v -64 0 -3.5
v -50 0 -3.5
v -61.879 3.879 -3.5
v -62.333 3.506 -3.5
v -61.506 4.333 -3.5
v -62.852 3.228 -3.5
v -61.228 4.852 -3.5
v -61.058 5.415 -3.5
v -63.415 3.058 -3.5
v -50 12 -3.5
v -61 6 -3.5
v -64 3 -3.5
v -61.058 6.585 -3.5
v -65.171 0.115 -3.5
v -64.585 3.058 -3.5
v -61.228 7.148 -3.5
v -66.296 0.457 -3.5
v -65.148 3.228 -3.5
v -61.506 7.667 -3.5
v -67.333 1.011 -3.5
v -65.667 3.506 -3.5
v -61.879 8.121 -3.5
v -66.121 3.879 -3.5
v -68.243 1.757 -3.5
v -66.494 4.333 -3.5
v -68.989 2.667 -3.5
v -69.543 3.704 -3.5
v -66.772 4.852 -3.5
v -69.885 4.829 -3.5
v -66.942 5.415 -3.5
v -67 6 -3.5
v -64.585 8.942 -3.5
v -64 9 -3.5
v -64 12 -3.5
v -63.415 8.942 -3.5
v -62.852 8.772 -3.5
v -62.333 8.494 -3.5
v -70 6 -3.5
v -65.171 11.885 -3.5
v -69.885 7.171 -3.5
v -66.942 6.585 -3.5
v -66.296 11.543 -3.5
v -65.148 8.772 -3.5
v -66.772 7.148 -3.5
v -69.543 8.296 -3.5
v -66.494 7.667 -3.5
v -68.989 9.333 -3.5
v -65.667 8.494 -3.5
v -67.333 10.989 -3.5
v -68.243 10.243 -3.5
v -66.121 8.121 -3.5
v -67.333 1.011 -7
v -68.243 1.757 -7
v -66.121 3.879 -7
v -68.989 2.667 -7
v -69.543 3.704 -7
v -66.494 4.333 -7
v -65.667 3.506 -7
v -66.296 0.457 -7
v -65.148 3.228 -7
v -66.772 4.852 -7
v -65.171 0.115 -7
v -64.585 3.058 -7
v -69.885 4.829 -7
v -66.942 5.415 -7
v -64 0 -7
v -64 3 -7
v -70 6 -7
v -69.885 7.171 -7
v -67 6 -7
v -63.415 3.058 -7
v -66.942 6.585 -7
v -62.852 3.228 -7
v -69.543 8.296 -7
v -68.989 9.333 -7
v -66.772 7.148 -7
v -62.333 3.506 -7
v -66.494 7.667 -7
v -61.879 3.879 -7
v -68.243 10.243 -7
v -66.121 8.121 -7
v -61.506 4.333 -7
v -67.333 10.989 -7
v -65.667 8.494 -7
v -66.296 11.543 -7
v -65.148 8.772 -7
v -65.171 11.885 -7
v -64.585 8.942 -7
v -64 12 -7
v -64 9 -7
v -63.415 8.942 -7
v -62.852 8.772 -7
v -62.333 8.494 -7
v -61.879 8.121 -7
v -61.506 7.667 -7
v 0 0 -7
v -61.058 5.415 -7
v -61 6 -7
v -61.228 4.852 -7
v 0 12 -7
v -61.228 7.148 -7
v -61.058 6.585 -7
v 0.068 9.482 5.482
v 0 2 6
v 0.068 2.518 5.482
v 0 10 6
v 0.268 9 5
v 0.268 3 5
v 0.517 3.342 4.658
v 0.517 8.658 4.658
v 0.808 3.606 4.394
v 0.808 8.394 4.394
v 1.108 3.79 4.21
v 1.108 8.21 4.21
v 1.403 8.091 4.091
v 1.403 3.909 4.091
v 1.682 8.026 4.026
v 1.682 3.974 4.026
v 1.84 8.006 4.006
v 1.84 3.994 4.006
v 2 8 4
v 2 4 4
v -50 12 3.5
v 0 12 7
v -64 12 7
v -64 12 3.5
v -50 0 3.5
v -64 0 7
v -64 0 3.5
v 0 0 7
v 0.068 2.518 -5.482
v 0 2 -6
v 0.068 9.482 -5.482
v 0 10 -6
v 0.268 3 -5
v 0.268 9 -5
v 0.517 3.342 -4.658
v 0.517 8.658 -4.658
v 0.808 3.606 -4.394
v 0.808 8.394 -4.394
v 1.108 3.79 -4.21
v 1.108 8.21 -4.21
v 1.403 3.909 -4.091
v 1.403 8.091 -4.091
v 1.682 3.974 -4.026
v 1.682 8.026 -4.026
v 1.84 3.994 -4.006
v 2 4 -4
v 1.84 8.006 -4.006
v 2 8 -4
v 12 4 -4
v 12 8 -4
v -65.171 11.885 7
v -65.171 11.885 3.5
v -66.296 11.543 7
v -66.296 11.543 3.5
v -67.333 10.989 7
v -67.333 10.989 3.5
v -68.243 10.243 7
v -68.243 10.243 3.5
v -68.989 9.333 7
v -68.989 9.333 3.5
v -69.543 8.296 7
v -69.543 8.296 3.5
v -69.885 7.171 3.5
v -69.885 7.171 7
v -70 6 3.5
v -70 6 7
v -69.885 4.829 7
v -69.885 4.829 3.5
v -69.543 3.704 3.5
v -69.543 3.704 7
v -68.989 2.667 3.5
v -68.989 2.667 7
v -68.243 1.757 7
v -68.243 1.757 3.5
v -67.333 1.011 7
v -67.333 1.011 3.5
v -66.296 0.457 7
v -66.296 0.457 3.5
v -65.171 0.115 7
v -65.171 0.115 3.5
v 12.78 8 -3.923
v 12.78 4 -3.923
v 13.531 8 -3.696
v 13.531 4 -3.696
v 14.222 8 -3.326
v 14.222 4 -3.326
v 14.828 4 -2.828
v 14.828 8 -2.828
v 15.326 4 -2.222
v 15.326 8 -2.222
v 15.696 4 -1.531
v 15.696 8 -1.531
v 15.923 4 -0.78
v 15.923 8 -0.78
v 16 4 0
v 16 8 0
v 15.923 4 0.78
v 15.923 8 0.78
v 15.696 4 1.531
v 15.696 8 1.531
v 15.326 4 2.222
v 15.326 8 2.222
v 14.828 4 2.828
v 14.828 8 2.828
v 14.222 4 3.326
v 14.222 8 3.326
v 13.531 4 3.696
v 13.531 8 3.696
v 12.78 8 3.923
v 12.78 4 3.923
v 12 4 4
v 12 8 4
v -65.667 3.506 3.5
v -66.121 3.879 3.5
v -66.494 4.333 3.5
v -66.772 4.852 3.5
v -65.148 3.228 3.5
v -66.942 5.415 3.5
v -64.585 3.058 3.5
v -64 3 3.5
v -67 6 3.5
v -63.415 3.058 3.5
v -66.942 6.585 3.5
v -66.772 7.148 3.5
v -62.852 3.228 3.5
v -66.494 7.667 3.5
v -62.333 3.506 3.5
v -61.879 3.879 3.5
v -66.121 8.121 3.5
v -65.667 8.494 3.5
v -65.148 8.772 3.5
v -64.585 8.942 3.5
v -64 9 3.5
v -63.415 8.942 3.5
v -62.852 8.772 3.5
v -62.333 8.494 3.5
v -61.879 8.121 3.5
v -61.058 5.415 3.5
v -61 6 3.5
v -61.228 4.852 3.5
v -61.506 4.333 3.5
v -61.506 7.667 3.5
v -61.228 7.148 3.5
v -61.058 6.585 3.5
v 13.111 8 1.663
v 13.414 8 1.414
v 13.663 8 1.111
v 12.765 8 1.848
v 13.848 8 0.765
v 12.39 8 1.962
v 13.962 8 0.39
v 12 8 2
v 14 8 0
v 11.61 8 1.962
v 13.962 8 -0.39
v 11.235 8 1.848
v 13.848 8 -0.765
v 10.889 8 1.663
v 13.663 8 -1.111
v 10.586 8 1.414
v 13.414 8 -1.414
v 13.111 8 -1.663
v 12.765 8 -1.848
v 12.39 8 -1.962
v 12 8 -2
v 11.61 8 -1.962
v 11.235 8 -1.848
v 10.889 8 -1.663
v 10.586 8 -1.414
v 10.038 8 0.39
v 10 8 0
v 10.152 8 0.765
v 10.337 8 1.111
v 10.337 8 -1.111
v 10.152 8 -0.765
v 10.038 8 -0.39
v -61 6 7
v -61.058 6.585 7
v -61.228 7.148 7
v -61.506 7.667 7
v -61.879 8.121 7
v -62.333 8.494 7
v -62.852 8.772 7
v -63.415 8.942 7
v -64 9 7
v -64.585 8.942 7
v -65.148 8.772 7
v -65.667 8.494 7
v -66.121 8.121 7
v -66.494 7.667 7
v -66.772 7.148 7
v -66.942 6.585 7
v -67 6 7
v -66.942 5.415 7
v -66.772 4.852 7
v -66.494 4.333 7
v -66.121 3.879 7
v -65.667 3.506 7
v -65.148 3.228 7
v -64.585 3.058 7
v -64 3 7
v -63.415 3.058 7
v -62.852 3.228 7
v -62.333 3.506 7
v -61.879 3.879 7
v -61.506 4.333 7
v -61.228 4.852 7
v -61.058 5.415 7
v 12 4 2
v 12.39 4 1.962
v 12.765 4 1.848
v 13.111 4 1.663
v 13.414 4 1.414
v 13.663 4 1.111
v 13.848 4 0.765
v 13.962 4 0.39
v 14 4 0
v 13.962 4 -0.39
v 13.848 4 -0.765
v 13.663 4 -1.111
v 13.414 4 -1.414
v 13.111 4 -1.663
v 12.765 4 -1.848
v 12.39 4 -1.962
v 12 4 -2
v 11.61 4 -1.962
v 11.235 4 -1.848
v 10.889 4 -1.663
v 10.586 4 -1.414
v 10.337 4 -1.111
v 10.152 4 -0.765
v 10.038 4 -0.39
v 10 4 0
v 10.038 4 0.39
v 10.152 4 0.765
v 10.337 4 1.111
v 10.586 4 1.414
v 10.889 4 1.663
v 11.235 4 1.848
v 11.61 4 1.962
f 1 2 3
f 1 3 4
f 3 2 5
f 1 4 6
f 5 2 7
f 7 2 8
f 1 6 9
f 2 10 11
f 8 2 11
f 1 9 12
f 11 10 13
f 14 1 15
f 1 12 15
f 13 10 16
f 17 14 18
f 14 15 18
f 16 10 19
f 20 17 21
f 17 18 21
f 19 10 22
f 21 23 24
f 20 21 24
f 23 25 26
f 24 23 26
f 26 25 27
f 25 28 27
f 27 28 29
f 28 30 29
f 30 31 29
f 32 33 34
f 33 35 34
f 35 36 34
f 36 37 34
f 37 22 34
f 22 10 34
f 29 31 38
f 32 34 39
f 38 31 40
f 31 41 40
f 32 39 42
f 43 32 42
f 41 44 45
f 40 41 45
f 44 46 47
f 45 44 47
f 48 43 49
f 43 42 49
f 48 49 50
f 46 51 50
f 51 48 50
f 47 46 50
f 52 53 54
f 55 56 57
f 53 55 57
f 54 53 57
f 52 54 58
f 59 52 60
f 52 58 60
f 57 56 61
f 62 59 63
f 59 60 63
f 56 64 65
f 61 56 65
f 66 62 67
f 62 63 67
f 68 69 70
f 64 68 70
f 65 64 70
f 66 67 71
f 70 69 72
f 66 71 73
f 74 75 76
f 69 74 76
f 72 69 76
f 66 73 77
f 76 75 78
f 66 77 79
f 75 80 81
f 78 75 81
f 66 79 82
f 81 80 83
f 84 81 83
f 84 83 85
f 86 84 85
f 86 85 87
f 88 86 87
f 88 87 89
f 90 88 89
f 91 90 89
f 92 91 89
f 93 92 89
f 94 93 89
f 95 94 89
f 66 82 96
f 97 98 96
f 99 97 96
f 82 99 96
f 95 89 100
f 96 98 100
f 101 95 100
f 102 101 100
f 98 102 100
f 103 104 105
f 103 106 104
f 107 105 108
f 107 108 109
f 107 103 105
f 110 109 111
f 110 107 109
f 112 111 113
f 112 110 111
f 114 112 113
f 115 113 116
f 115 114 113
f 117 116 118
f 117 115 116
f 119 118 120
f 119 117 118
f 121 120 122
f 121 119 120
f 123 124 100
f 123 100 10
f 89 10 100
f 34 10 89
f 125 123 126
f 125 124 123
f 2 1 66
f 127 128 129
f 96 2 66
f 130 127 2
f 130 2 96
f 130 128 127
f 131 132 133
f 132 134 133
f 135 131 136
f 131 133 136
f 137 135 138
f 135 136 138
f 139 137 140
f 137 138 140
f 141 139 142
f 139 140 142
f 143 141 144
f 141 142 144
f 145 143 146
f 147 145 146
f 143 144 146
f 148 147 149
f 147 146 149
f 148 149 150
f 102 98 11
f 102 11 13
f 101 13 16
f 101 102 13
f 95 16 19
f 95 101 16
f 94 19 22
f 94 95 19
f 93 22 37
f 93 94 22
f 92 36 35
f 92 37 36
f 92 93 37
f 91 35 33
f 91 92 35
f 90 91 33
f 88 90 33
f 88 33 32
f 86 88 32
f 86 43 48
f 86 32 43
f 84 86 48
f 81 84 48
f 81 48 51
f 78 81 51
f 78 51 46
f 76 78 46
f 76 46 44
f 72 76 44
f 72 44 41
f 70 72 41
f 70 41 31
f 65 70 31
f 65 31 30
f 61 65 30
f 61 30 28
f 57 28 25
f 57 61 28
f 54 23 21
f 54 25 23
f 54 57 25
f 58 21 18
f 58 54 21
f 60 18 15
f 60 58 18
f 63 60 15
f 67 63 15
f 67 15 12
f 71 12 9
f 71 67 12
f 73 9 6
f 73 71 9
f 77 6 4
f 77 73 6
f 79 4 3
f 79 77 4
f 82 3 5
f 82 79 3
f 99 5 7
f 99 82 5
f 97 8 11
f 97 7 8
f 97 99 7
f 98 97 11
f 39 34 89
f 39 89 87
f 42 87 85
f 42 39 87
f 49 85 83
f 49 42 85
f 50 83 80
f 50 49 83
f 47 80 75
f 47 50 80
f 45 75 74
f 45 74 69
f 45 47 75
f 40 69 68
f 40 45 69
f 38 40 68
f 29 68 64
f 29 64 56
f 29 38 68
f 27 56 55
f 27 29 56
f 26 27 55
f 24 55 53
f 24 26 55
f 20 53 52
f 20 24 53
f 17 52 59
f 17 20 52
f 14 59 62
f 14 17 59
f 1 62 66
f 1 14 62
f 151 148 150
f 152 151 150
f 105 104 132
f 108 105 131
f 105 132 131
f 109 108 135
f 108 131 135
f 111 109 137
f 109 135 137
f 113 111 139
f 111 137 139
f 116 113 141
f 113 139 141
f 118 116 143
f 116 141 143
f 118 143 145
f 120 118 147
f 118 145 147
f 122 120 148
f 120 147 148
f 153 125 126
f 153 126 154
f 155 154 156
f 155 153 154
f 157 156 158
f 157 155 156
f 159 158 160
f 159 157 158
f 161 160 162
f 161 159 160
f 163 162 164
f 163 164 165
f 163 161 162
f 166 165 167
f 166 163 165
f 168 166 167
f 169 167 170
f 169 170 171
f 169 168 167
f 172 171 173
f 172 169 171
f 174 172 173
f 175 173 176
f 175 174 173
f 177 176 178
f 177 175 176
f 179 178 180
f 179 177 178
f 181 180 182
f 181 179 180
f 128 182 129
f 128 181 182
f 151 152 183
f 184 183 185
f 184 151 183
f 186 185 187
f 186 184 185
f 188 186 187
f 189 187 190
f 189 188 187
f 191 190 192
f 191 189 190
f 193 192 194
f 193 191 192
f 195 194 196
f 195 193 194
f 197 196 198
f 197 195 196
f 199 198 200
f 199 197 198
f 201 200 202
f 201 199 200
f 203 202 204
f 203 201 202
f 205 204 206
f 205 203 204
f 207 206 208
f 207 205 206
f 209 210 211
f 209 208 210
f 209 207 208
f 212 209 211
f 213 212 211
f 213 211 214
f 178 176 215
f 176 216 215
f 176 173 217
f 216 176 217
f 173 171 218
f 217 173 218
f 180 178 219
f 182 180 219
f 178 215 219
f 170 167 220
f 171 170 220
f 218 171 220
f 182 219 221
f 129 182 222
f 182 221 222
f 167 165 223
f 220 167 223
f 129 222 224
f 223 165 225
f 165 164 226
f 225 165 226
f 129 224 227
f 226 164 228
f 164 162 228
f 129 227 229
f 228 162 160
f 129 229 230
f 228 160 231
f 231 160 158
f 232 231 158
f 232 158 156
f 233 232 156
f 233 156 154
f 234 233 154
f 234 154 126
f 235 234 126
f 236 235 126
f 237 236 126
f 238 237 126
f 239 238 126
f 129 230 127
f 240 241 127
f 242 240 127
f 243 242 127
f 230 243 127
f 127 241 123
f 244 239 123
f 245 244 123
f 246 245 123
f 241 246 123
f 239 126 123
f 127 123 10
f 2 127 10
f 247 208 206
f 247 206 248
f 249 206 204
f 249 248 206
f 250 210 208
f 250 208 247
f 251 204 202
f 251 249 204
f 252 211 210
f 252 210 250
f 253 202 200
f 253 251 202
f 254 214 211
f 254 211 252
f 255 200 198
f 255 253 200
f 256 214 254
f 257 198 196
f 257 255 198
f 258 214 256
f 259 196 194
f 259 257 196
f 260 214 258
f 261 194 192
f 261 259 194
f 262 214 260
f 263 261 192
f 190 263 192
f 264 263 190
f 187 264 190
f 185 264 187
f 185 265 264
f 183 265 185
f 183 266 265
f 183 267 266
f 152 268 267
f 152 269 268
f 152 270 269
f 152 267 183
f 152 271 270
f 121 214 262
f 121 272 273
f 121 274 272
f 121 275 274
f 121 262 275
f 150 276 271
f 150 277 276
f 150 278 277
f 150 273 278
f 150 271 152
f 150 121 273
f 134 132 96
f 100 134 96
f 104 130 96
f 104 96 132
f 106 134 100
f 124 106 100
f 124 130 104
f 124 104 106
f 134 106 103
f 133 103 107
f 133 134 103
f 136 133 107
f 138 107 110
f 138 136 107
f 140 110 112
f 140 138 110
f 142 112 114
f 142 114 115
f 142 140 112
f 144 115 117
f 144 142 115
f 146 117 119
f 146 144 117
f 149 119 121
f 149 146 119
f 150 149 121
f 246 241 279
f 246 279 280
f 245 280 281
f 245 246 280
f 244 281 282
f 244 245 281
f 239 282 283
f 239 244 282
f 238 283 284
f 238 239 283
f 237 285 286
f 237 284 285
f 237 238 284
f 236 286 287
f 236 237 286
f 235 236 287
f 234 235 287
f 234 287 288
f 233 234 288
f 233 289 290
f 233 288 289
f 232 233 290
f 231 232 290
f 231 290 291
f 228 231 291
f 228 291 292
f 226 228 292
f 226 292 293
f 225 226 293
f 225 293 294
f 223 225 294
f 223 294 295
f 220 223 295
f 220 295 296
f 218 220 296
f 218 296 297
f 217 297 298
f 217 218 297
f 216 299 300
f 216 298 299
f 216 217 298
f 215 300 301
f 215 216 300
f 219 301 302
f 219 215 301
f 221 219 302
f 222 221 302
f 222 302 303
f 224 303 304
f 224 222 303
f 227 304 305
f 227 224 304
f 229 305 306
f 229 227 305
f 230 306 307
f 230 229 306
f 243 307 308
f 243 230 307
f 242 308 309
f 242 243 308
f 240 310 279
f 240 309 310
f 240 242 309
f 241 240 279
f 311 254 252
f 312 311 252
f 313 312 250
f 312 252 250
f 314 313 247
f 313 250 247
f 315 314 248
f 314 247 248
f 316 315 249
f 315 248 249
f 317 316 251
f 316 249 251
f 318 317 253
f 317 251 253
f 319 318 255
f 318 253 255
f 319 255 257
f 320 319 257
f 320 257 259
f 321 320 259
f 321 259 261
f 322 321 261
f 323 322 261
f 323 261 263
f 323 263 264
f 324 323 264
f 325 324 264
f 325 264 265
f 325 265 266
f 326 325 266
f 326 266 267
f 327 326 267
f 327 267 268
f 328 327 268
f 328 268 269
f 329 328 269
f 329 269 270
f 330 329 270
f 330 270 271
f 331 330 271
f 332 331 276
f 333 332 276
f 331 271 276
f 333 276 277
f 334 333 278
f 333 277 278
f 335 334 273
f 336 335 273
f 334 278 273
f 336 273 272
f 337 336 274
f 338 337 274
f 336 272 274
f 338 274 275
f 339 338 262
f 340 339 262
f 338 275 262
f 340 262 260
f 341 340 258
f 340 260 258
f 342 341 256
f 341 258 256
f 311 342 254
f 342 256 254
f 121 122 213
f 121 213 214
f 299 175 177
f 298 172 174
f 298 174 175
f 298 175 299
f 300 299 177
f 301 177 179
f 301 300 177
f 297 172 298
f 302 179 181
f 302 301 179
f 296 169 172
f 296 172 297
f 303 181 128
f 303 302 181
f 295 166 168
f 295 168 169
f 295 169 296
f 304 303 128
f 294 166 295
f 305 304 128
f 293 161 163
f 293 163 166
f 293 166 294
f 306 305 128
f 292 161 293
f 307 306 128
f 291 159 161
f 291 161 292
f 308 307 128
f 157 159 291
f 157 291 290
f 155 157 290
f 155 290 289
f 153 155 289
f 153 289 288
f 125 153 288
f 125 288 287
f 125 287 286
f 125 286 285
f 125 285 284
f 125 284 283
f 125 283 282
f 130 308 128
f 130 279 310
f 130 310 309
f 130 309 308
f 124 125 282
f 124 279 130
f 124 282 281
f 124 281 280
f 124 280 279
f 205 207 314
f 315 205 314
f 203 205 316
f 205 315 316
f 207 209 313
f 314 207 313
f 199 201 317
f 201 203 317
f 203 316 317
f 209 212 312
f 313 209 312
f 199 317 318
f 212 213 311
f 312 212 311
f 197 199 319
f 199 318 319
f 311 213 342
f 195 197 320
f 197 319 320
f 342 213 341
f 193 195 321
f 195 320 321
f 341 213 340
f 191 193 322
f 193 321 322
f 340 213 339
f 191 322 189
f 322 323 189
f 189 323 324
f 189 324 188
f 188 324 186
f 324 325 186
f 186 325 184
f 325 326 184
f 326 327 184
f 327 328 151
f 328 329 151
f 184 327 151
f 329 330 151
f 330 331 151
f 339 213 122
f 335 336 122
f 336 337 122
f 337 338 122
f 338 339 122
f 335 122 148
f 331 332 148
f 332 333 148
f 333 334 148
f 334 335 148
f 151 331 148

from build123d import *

# Parameters (mm, degrees)
BOSS_EXTRUDE1_DEPTH     = 7
SKETCH2_W               = 8
SKETCH2_H               = 4
BOSS_EXTRUDE2_DEPTH     = 16
FILLET1_RADIUS          = 4
FILLET1_LENGTH          = 4
SKETCH3_R               = 2
CUT_EXTRUDE1_DEPTH      = 16
SKETCH5_W               = 20
SKETCH5_H               = 7
SKETCH5_W_2             = 14
SKETCH5_W_3             = 6
CUT_EXTRUDE2_DEPTH      = 33
CUT_EXTRUDE3_DEPTH      = 73.387844283
CUT_EXTRUDE3_DEPTH_BACK = 73.387844283
SKETCH6_R               = 3
FILLET2_R               = 2


with BuildPart() as part:
    # Sketch1 → Boss-Extrude1 (new, symmetric)
    with BuildSketch(Plane.XY):
        with BuildLine():
            Line((0, 0), (0, 12))
            Line((0, 12), (-64, 12))
            ThreePointArc((-64, 12), (-70, 6), (-64, 0))
            Line((-64, 0), (0, 0))
        make_face()
    extrude(amount=BOSS_EXTRUDE1_DEPTH, both=True)

    # Sketch2 → Boss-Extrude2 (add)
    with BuildSketch(Plane(origin=(0, 0, 0), x_dir=(0, 0, -1), z_dir=(1, 0, 0))):
        with Locations((0, 6)):
            Rectangle(SKETCH2_W, SKETCH2_H)
    extrude(amount=BOSS_EXTRUDE2_DEPTH)

    # Fillet1: full round fillet: the end face becomes a half cylinder, R = half its width
    fillet1_face = Plane((16, 6, 0), x_dir=(0, -1, 0), z_dir=(1, 0, 0))  # on the end face: x along it, z out of the body
    fillet1_slab = fillet1_face.offset(-FILLET1_RADIUS / 2) * Box(FILLET1_LENGTH, 2 * FILLET1_RADIUS, FILLET1_RADIUS, mode=Mode.PRIVATE)  # the body's end, R deep
    fillet1_round = Plane((12, 6, 0), x_dir=(1, 0, 0), z_dir=(0, -1, 0)) * Cylinder(FILLET1_RADIUS, FILLET1_LENGTH, mode=Mode.PRIVATE)  # its axis R under the face
    add(fillet1_slab - fillet1_round, mode=Mode.SUBTRACT)

    # Sketch3 → Cut-Extrude1 (cut)
    with BuildSketch(Plane(origin=(0, 8, 0), x_dir=(1, 0, 0), z_dir=(0, 1, 0))):
        with Locations(Location((12, 0, 0), (0, 0, 270))):
            Circle(SKETCH3_R)
    extrude(amount=-CUT_EXTRUDE1_DEPTH, mode=Mode.SUBTRACT)

    # Sketch5 → Cut-Extrude2 (cut)
    with BuildSketch(Plane(origin=(0, 12, 0), x_dir=(1, 0, 0), z_dir=(0, 1, 0))):
        with Locations((-80, 0)):
            Rectangle(SKETCH5_W, SKETCH5_H)
        with Locations((-57, 0)):
            Rectangle(SKETCH5_W_2, SKETCH5_H)
        with Locations((-67, 0)):
            Rectangle(SKETCH5_W_3, SKETCH5_H)
    extrude(amount=-CUT_EXTRUDE2_DEPTH, mode=Mode.SUBTRACT)

    # Sketch6 → Cut-Extrude3 (cut, two sides: drawn at the far end of the back side and taken through both)
    with BuildSketch(Plane.XY.offset(7).offset(-CUT_EXTRUDE3_DEPTH_BACK)):
        with Locations((-64, 6)):
            Circle(SKETCH6_R)
    extrude(amount=CUT_EXTRUDE3_DEPTH + CUT_EXTRUDE3_DEPTH_BACK, mode=Mode.SUBTRACT)

    # Fillet2
    fillet2_edges = [part.edges().sort_by_distance(p)[0] for p in [
        (0, 4, 0),
        (0, 6, -4),
        (0, 8, 0),
        (0, 6, 4),
    ]]
    fillet(fillet2_edges, radius=FILLET2_R)


solid = part.part
